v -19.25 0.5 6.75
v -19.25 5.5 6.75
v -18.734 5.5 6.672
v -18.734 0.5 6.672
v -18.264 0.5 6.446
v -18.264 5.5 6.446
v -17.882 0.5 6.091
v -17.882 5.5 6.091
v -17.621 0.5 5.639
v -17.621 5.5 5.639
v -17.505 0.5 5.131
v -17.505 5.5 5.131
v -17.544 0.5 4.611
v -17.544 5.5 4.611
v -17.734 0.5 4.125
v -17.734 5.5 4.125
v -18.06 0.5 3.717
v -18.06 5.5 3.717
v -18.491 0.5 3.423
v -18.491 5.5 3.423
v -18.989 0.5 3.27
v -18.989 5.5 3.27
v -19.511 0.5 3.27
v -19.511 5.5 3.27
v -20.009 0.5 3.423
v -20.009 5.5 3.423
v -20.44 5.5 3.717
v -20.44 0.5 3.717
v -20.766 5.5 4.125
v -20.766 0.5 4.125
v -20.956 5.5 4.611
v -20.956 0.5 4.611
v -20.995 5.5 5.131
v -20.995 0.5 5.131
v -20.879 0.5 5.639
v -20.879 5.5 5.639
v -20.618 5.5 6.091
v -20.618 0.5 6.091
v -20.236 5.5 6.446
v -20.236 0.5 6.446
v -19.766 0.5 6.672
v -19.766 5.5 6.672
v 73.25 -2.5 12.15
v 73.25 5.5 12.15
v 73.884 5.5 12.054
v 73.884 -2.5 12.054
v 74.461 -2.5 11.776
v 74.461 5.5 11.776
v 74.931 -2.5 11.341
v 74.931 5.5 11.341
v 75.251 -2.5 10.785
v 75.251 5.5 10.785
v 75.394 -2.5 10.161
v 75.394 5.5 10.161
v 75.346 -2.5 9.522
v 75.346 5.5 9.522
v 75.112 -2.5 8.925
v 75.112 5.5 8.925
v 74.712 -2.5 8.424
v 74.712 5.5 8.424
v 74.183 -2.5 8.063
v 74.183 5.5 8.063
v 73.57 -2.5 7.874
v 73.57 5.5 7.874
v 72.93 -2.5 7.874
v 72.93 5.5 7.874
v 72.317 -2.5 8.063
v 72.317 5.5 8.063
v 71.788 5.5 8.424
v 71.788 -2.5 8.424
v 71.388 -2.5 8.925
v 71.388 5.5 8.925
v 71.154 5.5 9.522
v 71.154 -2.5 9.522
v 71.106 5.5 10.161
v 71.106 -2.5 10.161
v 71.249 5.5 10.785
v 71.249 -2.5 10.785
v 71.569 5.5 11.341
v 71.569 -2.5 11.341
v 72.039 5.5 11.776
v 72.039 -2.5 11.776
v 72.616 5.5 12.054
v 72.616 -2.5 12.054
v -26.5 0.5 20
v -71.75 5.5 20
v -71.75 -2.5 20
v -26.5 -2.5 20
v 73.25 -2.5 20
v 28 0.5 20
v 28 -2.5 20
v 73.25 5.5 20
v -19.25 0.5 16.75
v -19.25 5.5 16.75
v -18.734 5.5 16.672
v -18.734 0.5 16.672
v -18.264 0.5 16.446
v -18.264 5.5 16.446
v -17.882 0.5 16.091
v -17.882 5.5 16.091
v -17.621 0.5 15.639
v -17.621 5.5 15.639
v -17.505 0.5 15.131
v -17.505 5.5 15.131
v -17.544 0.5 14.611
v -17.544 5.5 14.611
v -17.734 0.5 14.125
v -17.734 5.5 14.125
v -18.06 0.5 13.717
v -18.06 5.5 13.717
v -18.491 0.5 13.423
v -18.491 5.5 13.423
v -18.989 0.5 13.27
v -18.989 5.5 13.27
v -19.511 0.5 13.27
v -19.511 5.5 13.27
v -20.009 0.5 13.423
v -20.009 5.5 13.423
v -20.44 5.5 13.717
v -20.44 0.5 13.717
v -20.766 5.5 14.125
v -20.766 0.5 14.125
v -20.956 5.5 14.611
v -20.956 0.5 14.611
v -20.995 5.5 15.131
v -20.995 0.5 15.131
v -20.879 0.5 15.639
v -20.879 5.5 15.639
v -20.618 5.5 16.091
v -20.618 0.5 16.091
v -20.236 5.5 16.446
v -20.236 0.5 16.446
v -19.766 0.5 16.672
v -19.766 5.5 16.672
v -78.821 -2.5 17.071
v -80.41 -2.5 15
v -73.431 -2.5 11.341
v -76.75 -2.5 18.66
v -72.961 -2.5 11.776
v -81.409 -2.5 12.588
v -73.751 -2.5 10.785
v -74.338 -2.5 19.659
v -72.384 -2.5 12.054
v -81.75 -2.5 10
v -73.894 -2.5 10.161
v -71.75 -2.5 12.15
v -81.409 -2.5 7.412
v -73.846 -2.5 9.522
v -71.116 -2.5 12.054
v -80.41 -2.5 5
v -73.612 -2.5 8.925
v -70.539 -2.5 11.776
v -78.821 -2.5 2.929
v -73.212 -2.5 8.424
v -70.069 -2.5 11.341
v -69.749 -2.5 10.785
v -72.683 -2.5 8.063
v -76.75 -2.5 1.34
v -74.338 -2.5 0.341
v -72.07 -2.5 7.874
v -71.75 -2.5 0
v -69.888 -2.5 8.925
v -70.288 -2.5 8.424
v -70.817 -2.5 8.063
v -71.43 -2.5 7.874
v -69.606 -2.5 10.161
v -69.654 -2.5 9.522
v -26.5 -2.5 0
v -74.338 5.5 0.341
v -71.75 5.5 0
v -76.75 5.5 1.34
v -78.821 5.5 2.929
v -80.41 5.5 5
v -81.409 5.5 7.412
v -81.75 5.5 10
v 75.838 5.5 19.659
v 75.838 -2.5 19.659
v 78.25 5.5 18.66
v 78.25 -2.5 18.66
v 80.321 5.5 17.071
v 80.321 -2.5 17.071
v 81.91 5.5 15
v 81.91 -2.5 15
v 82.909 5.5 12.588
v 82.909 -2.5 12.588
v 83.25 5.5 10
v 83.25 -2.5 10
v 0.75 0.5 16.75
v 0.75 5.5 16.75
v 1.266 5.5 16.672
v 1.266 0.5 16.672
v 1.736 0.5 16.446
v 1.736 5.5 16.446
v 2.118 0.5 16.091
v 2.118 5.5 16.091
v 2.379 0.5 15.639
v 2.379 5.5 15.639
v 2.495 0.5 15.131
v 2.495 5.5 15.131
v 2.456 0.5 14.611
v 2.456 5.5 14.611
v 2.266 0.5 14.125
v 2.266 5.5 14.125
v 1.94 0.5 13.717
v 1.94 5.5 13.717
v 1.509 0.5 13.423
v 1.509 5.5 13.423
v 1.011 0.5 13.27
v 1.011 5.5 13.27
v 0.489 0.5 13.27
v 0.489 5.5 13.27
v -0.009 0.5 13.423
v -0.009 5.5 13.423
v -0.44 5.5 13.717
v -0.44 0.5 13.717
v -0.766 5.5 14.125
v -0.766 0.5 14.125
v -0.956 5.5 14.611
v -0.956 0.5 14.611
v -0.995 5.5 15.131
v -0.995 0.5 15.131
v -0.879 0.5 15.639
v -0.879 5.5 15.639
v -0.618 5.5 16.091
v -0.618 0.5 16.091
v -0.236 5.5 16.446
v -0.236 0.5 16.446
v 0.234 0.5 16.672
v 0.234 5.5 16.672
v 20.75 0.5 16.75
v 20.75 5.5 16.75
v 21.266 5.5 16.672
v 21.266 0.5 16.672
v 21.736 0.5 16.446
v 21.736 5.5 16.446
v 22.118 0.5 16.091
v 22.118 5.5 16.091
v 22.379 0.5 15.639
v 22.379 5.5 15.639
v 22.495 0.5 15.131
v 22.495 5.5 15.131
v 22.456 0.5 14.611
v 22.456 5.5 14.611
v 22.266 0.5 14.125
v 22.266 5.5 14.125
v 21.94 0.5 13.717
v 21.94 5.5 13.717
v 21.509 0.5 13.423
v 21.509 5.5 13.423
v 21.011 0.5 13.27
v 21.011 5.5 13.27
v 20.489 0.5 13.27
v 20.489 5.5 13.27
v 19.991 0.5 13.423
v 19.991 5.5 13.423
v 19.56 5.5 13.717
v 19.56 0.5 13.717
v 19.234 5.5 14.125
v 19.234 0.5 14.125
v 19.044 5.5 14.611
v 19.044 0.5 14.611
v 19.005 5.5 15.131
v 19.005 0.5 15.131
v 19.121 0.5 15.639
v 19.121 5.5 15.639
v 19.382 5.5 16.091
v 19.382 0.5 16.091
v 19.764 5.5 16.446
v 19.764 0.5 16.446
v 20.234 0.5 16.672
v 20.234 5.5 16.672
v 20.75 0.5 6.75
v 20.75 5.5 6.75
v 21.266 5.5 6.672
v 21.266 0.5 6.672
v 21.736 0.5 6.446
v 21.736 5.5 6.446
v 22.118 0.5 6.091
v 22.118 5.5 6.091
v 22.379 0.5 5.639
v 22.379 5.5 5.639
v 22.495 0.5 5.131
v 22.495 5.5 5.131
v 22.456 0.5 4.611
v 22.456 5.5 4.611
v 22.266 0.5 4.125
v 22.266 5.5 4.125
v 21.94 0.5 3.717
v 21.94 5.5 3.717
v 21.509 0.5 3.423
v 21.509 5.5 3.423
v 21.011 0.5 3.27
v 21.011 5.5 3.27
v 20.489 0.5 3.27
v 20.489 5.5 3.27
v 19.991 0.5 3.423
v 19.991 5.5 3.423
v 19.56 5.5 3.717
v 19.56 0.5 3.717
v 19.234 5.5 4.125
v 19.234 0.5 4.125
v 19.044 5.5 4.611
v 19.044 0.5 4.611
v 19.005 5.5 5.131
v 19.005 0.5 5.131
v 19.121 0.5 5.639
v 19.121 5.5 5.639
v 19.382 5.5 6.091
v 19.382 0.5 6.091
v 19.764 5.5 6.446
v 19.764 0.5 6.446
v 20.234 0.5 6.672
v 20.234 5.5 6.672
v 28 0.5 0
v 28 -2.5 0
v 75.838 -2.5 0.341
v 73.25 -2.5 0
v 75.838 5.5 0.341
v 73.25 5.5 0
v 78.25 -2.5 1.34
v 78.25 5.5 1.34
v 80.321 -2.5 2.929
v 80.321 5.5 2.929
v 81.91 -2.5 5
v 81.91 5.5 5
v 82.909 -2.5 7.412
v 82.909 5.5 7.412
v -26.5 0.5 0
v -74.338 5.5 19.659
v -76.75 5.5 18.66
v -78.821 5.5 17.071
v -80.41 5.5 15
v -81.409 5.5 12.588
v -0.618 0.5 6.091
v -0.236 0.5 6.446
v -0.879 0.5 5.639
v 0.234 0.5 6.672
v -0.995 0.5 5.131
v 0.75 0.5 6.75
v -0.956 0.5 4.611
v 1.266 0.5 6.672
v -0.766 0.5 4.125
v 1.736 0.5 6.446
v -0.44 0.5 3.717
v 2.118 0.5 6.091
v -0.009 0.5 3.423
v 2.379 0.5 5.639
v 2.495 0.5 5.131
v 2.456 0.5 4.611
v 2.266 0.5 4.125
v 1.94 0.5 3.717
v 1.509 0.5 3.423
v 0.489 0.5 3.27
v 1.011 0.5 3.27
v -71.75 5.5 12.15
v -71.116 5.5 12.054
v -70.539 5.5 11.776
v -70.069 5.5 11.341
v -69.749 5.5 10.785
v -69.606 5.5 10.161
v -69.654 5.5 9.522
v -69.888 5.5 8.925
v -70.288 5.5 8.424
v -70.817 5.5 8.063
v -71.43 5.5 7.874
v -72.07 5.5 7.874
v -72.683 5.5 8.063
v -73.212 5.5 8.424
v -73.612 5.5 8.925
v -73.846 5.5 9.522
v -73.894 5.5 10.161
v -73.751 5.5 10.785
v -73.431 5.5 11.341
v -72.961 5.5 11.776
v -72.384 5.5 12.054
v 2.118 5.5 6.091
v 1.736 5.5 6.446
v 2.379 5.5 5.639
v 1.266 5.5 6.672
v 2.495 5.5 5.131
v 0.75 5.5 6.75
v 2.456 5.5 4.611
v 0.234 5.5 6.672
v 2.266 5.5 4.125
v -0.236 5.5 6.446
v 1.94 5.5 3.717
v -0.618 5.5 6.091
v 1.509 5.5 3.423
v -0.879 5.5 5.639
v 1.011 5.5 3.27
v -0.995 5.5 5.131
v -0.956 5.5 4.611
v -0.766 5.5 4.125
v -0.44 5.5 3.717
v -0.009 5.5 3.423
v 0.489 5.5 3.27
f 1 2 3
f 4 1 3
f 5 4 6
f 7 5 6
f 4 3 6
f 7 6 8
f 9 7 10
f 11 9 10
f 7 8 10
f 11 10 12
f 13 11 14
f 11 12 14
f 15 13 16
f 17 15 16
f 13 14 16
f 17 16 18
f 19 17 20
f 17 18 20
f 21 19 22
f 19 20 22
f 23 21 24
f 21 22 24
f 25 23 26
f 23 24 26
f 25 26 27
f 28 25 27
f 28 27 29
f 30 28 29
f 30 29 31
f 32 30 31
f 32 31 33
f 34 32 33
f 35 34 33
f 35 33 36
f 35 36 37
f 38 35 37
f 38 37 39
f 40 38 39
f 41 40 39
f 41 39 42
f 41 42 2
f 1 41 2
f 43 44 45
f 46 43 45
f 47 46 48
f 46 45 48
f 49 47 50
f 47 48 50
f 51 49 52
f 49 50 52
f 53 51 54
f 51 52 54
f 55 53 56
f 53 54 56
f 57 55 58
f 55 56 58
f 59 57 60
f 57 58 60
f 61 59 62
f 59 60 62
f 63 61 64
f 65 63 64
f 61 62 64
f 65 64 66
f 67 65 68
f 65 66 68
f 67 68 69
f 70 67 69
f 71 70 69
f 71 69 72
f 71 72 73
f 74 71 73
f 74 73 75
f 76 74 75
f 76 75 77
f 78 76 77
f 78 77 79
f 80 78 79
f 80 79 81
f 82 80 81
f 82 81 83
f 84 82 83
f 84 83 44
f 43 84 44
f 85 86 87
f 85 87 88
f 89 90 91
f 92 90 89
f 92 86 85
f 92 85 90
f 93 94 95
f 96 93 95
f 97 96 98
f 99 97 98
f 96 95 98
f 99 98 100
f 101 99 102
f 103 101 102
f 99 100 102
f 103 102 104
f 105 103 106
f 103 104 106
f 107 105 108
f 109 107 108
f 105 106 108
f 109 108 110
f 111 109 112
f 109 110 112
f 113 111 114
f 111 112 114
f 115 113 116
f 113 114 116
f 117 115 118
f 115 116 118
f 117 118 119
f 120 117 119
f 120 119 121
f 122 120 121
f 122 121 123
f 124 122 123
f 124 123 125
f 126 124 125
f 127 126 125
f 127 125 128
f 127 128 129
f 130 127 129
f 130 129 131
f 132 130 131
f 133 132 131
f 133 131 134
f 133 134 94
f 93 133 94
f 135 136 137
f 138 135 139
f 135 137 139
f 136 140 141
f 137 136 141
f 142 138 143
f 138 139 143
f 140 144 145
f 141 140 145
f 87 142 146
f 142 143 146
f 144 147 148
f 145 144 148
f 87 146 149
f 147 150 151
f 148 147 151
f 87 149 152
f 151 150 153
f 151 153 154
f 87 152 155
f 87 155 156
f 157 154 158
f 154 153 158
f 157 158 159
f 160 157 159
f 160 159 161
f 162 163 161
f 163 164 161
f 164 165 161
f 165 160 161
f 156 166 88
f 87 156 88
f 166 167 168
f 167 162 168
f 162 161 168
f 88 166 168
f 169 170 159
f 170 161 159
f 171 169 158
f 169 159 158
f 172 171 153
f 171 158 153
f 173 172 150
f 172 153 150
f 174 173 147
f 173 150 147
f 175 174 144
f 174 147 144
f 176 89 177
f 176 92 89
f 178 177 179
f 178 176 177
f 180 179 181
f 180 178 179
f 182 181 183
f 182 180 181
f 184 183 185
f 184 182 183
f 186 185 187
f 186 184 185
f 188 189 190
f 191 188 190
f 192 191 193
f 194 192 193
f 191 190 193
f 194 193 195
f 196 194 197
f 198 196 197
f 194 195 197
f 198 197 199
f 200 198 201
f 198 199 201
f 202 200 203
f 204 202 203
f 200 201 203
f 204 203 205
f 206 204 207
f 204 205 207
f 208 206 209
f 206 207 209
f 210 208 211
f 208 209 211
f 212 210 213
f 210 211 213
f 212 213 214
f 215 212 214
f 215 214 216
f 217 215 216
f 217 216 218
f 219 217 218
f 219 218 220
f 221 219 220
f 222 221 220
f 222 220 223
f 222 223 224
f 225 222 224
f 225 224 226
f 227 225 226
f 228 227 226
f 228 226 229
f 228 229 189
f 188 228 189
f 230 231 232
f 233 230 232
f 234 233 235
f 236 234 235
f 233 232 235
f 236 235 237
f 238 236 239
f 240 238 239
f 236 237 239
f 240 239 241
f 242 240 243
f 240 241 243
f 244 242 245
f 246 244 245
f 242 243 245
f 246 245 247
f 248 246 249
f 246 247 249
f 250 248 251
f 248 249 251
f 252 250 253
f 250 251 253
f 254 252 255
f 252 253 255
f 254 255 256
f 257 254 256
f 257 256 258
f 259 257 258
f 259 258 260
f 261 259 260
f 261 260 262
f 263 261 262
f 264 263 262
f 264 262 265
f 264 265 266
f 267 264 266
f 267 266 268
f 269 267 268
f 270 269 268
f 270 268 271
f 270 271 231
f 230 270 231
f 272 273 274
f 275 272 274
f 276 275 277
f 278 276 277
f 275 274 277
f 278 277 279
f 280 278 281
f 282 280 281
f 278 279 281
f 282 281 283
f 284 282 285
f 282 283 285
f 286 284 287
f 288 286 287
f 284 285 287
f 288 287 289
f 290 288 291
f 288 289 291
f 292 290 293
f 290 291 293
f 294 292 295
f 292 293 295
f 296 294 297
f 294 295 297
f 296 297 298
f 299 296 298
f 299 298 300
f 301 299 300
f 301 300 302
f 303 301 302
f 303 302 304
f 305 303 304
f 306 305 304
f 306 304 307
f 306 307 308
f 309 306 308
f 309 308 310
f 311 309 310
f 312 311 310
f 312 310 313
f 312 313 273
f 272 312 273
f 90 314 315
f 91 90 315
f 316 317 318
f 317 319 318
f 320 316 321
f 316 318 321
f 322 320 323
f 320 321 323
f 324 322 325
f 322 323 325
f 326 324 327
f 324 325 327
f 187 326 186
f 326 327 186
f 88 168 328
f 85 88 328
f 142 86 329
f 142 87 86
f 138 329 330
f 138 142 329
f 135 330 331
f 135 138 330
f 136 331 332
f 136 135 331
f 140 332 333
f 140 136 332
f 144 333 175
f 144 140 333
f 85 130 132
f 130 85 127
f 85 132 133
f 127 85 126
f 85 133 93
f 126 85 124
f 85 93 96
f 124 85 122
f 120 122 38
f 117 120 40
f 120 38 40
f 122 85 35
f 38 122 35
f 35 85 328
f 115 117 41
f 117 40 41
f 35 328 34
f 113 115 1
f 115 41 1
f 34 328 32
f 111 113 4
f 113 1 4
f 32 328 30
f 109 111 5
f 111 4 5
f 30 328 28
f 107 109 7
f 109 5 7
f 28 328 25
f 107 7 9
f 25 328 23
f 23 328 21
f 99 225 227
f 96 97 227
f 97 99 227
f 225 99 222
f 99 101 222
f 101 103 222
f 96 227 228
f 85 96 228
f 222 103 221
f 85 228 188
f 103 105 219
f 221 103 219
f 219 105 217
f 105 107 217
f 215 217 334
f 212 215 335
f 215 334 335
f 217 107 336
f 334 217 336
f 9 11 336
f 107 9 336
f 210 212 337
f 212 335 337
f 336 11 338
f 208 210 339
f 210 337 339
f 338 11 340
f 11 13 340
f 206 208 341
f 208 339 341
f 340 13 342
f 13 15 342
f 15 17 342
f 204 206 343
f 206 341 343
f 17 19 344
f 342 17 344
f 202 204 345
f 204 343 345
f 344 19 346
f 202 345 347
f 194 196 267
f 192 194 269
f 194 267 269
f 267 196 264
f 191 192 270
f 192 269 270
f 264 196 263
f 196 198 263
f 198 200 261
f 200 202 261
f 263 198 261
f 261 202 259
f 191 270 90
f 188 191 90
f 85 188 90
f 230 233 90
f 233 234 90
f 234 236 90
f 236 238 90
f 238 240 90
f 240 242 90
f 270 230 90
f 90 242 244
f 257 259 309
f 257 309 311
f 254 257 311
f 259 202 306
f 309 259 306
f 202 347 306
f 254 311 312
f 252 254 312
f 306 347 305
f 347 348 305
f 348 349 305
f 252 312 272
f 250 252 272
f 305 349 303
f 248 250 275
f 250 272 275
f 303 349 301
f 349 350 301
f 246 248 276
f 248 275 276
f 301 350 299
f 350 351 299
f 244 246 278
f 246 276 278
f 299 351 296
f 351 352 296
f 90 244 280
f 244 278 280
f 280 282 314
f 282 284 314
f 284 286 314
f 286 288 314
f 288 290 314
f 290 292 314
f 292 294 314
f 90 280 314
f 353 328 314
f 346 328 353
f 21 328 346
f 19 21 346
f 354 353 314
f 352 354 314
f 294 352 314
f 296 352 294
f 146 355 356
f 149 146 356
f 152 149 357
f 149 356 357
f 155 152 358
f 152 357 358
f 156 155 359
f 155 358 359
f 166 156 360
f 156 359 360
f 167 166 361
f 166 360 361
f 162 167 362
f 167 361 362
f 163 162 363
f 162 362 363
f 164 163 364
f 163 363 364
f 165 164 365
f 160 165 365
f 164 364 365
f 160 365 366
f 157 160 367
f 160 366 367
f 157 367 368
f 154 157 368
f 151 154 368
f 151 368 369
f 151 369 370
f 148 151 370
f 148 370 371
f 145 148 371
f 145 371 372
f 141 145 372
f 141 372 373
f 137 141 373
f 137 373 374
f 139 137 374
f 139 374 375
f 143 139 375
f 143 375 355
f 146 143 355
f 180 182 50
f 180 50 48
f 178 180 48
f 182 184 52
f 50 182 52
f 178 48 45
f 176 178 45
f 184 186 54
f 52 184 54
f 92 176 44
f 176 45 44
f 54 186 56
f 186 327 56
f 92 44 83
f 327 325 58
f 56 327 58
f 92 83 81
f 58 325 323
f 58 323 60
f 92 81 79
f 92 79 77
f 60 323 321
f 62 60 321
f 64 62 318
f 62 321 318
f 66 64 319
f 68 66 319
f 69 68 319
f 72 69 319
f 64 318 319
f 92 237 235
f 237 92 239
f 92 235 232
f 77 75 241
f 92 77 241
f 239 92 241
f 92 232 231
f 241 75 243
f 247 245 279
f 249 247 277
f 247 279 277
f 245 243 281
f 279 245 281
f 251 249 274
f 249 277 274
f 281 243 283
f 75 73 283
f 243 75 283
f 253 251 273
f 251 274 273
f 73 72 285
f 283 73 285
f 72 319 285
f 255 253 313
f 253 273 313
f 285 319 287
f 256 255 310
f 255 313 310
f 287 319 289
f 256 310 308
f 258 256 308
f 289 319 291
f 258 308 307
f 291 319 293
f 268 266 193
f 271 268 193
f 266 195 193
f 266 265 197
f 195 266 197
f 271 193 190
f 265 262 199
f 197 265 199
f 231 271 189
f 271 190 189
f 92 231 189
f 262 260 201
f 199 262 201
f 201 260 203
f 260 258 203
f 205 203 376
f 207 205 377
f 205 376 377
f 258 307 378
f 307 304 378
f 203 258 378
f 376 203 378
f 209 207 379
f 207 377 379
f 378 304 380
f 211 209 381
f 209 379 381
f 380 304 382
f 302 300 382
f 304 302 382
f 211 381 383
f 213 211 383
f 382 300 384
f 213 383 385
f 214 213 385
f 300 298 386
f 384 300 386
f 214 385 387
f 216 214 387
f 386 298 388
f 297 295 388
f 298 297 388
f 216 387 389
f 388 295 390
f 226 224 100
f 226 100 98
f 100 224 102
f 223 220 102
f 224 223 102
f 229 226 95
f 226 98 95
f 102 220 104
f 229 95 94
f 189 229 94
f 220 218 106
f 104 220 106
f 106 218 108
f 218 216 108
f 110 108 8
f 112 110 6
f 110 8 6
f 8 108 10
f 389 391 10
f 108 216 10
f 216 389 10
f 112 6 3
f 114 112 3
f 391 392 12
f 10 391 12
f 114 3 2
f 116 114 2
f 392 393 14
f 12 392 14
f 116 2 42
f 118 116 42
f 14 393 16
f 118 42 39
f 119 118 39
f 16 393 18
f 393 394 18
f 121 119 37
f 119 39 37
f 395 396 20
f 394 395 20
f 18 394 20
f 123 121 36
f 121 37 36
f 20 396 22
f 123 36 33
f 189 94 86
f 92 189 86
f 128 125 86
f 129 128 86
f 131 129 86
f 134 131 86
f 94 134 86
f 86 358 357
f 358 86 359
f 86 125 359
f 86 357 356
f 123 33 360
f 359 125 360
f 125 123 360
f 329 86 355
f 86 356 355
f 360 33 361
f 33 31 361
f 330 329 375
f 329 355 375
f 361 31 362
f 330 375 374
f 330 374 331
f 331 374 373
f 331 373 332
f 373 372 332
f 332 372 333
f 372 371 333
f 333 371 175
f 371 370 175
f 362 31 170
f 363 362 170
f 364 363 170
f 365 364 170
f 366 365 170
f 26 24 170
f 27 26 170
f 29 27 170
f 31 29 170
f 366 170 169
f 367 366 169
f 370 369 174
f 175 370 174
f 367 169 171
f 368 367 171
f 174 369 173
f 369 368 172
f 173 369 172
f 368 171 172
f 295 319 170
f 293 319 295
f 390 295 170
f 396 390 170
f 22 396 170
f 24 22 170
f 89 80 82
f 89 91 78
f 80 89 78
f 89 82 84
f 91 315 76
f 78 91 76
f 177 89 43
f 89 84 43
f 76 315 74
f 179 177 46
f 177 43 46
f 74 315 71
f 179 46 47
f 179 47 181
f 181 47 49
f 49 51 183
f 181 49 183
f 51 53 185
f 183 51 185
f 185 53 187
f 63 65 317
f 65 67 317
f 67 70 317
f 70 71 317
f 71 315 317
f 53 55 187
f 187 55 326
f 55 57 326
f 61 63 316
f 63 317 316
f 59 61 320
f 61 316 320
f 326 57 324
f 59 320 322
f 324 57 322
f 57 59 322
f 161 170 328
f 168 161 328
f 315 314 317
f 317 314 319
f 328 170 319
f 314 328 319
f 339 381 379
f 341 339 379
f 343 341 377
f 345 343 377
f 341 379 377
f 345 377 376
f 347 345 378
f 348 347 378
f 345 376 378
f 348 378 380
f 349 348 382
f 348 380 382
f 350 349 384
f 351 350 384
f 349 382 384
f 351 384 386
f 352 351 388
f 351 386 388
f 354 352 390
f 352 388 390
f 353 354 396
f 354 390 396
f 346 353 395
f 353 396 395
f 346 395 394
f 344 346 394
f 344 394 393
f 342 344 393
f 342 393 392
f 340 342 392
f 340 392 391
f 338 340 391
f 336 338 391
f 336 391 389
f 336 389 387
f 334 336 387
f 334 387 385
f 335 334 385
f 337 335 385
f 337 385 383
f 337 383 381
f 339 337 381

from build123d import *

# Parameters (mm, degrees)
EXTRUDE_1_DEPTH     = 20
SKETCH_2_R          = 2.15
SKETCH_2_R_2        = 1.75
CUT_EXTRUDE_1_DEPTH = 20
FILLET_1_R          = 10


with BuildPart() as part:
    # 스케치1 → 보스-돌출1 (new body)
    with BuildSketch(Plane.XY):
        Polygon((28, -2.5), (83.25, -2.5), (83.25, 5.5), (-81.75, 5.5), (-81.75, -2.5), (-26.5, -2.5), (-26.5, 0.5), (28, 0.5), align=None)
    extrude(amount=EXTRUDE_1_DEPTH)

    # 스케치2 → 컷-돌출1 (cut)
    with BuildSketch(Plane(origin=(0, 5.5, 0), x_dir=(1, 0, 0), z_dir=(0, 1, 0))):
        with Locations(Location((-71.75, -10, 0), (0, 0, 270))):
            Circle(SKETCH_2_R)
        with Locations(Location((73.25, -10, 0), (0, 0, 270))):
            Circle(SKETCH_2_R)
        with Locations(Location((-19.25, -5, 0), (0, 0, 270))):
            Circle(SKETCH_2_R_2)
        with Locations(Location((0.75, -5, 0), (0, 0, 270))):
            Circle(SKETCH_2_R_2)
        with Locations(Location((20.75, -5, 0), (0, 0, 270))):
            Circle(SKETCH_2_R_2)
        with Locations(Location((20.75, -15, 0), (0, 0, 270))):
            Circle(SKETCH_2_R_2)
        with Locations(Location((0.75, -15, 0), (0, 0, 270))):
            Circle(SKETCH_2_R_2)
        with Locations(Location((-19.25, -15, 0), (0, 0, 270))):
            Circle(SKETCH_2_R_2)
    extrude(amount=-CUT_EXTRUDE_1_DEPTH, mode=Mode.SUBTRACT)

    # 필렛1
    fillet_1_edges = [part.edges().sort_by_distance(p)[0] for p in [
        (83.25, 1.5, 0),
        (83.25, 1.5, 20),
        (-81.75, 1.5, 0),
        (-81.75, 1.5, 20),
    ]]
    fillet(fillet_1_edges, radius=FILLET_1_R - 0.0001)  # a hair under: the kernel refuses the full size


solid = part.part
